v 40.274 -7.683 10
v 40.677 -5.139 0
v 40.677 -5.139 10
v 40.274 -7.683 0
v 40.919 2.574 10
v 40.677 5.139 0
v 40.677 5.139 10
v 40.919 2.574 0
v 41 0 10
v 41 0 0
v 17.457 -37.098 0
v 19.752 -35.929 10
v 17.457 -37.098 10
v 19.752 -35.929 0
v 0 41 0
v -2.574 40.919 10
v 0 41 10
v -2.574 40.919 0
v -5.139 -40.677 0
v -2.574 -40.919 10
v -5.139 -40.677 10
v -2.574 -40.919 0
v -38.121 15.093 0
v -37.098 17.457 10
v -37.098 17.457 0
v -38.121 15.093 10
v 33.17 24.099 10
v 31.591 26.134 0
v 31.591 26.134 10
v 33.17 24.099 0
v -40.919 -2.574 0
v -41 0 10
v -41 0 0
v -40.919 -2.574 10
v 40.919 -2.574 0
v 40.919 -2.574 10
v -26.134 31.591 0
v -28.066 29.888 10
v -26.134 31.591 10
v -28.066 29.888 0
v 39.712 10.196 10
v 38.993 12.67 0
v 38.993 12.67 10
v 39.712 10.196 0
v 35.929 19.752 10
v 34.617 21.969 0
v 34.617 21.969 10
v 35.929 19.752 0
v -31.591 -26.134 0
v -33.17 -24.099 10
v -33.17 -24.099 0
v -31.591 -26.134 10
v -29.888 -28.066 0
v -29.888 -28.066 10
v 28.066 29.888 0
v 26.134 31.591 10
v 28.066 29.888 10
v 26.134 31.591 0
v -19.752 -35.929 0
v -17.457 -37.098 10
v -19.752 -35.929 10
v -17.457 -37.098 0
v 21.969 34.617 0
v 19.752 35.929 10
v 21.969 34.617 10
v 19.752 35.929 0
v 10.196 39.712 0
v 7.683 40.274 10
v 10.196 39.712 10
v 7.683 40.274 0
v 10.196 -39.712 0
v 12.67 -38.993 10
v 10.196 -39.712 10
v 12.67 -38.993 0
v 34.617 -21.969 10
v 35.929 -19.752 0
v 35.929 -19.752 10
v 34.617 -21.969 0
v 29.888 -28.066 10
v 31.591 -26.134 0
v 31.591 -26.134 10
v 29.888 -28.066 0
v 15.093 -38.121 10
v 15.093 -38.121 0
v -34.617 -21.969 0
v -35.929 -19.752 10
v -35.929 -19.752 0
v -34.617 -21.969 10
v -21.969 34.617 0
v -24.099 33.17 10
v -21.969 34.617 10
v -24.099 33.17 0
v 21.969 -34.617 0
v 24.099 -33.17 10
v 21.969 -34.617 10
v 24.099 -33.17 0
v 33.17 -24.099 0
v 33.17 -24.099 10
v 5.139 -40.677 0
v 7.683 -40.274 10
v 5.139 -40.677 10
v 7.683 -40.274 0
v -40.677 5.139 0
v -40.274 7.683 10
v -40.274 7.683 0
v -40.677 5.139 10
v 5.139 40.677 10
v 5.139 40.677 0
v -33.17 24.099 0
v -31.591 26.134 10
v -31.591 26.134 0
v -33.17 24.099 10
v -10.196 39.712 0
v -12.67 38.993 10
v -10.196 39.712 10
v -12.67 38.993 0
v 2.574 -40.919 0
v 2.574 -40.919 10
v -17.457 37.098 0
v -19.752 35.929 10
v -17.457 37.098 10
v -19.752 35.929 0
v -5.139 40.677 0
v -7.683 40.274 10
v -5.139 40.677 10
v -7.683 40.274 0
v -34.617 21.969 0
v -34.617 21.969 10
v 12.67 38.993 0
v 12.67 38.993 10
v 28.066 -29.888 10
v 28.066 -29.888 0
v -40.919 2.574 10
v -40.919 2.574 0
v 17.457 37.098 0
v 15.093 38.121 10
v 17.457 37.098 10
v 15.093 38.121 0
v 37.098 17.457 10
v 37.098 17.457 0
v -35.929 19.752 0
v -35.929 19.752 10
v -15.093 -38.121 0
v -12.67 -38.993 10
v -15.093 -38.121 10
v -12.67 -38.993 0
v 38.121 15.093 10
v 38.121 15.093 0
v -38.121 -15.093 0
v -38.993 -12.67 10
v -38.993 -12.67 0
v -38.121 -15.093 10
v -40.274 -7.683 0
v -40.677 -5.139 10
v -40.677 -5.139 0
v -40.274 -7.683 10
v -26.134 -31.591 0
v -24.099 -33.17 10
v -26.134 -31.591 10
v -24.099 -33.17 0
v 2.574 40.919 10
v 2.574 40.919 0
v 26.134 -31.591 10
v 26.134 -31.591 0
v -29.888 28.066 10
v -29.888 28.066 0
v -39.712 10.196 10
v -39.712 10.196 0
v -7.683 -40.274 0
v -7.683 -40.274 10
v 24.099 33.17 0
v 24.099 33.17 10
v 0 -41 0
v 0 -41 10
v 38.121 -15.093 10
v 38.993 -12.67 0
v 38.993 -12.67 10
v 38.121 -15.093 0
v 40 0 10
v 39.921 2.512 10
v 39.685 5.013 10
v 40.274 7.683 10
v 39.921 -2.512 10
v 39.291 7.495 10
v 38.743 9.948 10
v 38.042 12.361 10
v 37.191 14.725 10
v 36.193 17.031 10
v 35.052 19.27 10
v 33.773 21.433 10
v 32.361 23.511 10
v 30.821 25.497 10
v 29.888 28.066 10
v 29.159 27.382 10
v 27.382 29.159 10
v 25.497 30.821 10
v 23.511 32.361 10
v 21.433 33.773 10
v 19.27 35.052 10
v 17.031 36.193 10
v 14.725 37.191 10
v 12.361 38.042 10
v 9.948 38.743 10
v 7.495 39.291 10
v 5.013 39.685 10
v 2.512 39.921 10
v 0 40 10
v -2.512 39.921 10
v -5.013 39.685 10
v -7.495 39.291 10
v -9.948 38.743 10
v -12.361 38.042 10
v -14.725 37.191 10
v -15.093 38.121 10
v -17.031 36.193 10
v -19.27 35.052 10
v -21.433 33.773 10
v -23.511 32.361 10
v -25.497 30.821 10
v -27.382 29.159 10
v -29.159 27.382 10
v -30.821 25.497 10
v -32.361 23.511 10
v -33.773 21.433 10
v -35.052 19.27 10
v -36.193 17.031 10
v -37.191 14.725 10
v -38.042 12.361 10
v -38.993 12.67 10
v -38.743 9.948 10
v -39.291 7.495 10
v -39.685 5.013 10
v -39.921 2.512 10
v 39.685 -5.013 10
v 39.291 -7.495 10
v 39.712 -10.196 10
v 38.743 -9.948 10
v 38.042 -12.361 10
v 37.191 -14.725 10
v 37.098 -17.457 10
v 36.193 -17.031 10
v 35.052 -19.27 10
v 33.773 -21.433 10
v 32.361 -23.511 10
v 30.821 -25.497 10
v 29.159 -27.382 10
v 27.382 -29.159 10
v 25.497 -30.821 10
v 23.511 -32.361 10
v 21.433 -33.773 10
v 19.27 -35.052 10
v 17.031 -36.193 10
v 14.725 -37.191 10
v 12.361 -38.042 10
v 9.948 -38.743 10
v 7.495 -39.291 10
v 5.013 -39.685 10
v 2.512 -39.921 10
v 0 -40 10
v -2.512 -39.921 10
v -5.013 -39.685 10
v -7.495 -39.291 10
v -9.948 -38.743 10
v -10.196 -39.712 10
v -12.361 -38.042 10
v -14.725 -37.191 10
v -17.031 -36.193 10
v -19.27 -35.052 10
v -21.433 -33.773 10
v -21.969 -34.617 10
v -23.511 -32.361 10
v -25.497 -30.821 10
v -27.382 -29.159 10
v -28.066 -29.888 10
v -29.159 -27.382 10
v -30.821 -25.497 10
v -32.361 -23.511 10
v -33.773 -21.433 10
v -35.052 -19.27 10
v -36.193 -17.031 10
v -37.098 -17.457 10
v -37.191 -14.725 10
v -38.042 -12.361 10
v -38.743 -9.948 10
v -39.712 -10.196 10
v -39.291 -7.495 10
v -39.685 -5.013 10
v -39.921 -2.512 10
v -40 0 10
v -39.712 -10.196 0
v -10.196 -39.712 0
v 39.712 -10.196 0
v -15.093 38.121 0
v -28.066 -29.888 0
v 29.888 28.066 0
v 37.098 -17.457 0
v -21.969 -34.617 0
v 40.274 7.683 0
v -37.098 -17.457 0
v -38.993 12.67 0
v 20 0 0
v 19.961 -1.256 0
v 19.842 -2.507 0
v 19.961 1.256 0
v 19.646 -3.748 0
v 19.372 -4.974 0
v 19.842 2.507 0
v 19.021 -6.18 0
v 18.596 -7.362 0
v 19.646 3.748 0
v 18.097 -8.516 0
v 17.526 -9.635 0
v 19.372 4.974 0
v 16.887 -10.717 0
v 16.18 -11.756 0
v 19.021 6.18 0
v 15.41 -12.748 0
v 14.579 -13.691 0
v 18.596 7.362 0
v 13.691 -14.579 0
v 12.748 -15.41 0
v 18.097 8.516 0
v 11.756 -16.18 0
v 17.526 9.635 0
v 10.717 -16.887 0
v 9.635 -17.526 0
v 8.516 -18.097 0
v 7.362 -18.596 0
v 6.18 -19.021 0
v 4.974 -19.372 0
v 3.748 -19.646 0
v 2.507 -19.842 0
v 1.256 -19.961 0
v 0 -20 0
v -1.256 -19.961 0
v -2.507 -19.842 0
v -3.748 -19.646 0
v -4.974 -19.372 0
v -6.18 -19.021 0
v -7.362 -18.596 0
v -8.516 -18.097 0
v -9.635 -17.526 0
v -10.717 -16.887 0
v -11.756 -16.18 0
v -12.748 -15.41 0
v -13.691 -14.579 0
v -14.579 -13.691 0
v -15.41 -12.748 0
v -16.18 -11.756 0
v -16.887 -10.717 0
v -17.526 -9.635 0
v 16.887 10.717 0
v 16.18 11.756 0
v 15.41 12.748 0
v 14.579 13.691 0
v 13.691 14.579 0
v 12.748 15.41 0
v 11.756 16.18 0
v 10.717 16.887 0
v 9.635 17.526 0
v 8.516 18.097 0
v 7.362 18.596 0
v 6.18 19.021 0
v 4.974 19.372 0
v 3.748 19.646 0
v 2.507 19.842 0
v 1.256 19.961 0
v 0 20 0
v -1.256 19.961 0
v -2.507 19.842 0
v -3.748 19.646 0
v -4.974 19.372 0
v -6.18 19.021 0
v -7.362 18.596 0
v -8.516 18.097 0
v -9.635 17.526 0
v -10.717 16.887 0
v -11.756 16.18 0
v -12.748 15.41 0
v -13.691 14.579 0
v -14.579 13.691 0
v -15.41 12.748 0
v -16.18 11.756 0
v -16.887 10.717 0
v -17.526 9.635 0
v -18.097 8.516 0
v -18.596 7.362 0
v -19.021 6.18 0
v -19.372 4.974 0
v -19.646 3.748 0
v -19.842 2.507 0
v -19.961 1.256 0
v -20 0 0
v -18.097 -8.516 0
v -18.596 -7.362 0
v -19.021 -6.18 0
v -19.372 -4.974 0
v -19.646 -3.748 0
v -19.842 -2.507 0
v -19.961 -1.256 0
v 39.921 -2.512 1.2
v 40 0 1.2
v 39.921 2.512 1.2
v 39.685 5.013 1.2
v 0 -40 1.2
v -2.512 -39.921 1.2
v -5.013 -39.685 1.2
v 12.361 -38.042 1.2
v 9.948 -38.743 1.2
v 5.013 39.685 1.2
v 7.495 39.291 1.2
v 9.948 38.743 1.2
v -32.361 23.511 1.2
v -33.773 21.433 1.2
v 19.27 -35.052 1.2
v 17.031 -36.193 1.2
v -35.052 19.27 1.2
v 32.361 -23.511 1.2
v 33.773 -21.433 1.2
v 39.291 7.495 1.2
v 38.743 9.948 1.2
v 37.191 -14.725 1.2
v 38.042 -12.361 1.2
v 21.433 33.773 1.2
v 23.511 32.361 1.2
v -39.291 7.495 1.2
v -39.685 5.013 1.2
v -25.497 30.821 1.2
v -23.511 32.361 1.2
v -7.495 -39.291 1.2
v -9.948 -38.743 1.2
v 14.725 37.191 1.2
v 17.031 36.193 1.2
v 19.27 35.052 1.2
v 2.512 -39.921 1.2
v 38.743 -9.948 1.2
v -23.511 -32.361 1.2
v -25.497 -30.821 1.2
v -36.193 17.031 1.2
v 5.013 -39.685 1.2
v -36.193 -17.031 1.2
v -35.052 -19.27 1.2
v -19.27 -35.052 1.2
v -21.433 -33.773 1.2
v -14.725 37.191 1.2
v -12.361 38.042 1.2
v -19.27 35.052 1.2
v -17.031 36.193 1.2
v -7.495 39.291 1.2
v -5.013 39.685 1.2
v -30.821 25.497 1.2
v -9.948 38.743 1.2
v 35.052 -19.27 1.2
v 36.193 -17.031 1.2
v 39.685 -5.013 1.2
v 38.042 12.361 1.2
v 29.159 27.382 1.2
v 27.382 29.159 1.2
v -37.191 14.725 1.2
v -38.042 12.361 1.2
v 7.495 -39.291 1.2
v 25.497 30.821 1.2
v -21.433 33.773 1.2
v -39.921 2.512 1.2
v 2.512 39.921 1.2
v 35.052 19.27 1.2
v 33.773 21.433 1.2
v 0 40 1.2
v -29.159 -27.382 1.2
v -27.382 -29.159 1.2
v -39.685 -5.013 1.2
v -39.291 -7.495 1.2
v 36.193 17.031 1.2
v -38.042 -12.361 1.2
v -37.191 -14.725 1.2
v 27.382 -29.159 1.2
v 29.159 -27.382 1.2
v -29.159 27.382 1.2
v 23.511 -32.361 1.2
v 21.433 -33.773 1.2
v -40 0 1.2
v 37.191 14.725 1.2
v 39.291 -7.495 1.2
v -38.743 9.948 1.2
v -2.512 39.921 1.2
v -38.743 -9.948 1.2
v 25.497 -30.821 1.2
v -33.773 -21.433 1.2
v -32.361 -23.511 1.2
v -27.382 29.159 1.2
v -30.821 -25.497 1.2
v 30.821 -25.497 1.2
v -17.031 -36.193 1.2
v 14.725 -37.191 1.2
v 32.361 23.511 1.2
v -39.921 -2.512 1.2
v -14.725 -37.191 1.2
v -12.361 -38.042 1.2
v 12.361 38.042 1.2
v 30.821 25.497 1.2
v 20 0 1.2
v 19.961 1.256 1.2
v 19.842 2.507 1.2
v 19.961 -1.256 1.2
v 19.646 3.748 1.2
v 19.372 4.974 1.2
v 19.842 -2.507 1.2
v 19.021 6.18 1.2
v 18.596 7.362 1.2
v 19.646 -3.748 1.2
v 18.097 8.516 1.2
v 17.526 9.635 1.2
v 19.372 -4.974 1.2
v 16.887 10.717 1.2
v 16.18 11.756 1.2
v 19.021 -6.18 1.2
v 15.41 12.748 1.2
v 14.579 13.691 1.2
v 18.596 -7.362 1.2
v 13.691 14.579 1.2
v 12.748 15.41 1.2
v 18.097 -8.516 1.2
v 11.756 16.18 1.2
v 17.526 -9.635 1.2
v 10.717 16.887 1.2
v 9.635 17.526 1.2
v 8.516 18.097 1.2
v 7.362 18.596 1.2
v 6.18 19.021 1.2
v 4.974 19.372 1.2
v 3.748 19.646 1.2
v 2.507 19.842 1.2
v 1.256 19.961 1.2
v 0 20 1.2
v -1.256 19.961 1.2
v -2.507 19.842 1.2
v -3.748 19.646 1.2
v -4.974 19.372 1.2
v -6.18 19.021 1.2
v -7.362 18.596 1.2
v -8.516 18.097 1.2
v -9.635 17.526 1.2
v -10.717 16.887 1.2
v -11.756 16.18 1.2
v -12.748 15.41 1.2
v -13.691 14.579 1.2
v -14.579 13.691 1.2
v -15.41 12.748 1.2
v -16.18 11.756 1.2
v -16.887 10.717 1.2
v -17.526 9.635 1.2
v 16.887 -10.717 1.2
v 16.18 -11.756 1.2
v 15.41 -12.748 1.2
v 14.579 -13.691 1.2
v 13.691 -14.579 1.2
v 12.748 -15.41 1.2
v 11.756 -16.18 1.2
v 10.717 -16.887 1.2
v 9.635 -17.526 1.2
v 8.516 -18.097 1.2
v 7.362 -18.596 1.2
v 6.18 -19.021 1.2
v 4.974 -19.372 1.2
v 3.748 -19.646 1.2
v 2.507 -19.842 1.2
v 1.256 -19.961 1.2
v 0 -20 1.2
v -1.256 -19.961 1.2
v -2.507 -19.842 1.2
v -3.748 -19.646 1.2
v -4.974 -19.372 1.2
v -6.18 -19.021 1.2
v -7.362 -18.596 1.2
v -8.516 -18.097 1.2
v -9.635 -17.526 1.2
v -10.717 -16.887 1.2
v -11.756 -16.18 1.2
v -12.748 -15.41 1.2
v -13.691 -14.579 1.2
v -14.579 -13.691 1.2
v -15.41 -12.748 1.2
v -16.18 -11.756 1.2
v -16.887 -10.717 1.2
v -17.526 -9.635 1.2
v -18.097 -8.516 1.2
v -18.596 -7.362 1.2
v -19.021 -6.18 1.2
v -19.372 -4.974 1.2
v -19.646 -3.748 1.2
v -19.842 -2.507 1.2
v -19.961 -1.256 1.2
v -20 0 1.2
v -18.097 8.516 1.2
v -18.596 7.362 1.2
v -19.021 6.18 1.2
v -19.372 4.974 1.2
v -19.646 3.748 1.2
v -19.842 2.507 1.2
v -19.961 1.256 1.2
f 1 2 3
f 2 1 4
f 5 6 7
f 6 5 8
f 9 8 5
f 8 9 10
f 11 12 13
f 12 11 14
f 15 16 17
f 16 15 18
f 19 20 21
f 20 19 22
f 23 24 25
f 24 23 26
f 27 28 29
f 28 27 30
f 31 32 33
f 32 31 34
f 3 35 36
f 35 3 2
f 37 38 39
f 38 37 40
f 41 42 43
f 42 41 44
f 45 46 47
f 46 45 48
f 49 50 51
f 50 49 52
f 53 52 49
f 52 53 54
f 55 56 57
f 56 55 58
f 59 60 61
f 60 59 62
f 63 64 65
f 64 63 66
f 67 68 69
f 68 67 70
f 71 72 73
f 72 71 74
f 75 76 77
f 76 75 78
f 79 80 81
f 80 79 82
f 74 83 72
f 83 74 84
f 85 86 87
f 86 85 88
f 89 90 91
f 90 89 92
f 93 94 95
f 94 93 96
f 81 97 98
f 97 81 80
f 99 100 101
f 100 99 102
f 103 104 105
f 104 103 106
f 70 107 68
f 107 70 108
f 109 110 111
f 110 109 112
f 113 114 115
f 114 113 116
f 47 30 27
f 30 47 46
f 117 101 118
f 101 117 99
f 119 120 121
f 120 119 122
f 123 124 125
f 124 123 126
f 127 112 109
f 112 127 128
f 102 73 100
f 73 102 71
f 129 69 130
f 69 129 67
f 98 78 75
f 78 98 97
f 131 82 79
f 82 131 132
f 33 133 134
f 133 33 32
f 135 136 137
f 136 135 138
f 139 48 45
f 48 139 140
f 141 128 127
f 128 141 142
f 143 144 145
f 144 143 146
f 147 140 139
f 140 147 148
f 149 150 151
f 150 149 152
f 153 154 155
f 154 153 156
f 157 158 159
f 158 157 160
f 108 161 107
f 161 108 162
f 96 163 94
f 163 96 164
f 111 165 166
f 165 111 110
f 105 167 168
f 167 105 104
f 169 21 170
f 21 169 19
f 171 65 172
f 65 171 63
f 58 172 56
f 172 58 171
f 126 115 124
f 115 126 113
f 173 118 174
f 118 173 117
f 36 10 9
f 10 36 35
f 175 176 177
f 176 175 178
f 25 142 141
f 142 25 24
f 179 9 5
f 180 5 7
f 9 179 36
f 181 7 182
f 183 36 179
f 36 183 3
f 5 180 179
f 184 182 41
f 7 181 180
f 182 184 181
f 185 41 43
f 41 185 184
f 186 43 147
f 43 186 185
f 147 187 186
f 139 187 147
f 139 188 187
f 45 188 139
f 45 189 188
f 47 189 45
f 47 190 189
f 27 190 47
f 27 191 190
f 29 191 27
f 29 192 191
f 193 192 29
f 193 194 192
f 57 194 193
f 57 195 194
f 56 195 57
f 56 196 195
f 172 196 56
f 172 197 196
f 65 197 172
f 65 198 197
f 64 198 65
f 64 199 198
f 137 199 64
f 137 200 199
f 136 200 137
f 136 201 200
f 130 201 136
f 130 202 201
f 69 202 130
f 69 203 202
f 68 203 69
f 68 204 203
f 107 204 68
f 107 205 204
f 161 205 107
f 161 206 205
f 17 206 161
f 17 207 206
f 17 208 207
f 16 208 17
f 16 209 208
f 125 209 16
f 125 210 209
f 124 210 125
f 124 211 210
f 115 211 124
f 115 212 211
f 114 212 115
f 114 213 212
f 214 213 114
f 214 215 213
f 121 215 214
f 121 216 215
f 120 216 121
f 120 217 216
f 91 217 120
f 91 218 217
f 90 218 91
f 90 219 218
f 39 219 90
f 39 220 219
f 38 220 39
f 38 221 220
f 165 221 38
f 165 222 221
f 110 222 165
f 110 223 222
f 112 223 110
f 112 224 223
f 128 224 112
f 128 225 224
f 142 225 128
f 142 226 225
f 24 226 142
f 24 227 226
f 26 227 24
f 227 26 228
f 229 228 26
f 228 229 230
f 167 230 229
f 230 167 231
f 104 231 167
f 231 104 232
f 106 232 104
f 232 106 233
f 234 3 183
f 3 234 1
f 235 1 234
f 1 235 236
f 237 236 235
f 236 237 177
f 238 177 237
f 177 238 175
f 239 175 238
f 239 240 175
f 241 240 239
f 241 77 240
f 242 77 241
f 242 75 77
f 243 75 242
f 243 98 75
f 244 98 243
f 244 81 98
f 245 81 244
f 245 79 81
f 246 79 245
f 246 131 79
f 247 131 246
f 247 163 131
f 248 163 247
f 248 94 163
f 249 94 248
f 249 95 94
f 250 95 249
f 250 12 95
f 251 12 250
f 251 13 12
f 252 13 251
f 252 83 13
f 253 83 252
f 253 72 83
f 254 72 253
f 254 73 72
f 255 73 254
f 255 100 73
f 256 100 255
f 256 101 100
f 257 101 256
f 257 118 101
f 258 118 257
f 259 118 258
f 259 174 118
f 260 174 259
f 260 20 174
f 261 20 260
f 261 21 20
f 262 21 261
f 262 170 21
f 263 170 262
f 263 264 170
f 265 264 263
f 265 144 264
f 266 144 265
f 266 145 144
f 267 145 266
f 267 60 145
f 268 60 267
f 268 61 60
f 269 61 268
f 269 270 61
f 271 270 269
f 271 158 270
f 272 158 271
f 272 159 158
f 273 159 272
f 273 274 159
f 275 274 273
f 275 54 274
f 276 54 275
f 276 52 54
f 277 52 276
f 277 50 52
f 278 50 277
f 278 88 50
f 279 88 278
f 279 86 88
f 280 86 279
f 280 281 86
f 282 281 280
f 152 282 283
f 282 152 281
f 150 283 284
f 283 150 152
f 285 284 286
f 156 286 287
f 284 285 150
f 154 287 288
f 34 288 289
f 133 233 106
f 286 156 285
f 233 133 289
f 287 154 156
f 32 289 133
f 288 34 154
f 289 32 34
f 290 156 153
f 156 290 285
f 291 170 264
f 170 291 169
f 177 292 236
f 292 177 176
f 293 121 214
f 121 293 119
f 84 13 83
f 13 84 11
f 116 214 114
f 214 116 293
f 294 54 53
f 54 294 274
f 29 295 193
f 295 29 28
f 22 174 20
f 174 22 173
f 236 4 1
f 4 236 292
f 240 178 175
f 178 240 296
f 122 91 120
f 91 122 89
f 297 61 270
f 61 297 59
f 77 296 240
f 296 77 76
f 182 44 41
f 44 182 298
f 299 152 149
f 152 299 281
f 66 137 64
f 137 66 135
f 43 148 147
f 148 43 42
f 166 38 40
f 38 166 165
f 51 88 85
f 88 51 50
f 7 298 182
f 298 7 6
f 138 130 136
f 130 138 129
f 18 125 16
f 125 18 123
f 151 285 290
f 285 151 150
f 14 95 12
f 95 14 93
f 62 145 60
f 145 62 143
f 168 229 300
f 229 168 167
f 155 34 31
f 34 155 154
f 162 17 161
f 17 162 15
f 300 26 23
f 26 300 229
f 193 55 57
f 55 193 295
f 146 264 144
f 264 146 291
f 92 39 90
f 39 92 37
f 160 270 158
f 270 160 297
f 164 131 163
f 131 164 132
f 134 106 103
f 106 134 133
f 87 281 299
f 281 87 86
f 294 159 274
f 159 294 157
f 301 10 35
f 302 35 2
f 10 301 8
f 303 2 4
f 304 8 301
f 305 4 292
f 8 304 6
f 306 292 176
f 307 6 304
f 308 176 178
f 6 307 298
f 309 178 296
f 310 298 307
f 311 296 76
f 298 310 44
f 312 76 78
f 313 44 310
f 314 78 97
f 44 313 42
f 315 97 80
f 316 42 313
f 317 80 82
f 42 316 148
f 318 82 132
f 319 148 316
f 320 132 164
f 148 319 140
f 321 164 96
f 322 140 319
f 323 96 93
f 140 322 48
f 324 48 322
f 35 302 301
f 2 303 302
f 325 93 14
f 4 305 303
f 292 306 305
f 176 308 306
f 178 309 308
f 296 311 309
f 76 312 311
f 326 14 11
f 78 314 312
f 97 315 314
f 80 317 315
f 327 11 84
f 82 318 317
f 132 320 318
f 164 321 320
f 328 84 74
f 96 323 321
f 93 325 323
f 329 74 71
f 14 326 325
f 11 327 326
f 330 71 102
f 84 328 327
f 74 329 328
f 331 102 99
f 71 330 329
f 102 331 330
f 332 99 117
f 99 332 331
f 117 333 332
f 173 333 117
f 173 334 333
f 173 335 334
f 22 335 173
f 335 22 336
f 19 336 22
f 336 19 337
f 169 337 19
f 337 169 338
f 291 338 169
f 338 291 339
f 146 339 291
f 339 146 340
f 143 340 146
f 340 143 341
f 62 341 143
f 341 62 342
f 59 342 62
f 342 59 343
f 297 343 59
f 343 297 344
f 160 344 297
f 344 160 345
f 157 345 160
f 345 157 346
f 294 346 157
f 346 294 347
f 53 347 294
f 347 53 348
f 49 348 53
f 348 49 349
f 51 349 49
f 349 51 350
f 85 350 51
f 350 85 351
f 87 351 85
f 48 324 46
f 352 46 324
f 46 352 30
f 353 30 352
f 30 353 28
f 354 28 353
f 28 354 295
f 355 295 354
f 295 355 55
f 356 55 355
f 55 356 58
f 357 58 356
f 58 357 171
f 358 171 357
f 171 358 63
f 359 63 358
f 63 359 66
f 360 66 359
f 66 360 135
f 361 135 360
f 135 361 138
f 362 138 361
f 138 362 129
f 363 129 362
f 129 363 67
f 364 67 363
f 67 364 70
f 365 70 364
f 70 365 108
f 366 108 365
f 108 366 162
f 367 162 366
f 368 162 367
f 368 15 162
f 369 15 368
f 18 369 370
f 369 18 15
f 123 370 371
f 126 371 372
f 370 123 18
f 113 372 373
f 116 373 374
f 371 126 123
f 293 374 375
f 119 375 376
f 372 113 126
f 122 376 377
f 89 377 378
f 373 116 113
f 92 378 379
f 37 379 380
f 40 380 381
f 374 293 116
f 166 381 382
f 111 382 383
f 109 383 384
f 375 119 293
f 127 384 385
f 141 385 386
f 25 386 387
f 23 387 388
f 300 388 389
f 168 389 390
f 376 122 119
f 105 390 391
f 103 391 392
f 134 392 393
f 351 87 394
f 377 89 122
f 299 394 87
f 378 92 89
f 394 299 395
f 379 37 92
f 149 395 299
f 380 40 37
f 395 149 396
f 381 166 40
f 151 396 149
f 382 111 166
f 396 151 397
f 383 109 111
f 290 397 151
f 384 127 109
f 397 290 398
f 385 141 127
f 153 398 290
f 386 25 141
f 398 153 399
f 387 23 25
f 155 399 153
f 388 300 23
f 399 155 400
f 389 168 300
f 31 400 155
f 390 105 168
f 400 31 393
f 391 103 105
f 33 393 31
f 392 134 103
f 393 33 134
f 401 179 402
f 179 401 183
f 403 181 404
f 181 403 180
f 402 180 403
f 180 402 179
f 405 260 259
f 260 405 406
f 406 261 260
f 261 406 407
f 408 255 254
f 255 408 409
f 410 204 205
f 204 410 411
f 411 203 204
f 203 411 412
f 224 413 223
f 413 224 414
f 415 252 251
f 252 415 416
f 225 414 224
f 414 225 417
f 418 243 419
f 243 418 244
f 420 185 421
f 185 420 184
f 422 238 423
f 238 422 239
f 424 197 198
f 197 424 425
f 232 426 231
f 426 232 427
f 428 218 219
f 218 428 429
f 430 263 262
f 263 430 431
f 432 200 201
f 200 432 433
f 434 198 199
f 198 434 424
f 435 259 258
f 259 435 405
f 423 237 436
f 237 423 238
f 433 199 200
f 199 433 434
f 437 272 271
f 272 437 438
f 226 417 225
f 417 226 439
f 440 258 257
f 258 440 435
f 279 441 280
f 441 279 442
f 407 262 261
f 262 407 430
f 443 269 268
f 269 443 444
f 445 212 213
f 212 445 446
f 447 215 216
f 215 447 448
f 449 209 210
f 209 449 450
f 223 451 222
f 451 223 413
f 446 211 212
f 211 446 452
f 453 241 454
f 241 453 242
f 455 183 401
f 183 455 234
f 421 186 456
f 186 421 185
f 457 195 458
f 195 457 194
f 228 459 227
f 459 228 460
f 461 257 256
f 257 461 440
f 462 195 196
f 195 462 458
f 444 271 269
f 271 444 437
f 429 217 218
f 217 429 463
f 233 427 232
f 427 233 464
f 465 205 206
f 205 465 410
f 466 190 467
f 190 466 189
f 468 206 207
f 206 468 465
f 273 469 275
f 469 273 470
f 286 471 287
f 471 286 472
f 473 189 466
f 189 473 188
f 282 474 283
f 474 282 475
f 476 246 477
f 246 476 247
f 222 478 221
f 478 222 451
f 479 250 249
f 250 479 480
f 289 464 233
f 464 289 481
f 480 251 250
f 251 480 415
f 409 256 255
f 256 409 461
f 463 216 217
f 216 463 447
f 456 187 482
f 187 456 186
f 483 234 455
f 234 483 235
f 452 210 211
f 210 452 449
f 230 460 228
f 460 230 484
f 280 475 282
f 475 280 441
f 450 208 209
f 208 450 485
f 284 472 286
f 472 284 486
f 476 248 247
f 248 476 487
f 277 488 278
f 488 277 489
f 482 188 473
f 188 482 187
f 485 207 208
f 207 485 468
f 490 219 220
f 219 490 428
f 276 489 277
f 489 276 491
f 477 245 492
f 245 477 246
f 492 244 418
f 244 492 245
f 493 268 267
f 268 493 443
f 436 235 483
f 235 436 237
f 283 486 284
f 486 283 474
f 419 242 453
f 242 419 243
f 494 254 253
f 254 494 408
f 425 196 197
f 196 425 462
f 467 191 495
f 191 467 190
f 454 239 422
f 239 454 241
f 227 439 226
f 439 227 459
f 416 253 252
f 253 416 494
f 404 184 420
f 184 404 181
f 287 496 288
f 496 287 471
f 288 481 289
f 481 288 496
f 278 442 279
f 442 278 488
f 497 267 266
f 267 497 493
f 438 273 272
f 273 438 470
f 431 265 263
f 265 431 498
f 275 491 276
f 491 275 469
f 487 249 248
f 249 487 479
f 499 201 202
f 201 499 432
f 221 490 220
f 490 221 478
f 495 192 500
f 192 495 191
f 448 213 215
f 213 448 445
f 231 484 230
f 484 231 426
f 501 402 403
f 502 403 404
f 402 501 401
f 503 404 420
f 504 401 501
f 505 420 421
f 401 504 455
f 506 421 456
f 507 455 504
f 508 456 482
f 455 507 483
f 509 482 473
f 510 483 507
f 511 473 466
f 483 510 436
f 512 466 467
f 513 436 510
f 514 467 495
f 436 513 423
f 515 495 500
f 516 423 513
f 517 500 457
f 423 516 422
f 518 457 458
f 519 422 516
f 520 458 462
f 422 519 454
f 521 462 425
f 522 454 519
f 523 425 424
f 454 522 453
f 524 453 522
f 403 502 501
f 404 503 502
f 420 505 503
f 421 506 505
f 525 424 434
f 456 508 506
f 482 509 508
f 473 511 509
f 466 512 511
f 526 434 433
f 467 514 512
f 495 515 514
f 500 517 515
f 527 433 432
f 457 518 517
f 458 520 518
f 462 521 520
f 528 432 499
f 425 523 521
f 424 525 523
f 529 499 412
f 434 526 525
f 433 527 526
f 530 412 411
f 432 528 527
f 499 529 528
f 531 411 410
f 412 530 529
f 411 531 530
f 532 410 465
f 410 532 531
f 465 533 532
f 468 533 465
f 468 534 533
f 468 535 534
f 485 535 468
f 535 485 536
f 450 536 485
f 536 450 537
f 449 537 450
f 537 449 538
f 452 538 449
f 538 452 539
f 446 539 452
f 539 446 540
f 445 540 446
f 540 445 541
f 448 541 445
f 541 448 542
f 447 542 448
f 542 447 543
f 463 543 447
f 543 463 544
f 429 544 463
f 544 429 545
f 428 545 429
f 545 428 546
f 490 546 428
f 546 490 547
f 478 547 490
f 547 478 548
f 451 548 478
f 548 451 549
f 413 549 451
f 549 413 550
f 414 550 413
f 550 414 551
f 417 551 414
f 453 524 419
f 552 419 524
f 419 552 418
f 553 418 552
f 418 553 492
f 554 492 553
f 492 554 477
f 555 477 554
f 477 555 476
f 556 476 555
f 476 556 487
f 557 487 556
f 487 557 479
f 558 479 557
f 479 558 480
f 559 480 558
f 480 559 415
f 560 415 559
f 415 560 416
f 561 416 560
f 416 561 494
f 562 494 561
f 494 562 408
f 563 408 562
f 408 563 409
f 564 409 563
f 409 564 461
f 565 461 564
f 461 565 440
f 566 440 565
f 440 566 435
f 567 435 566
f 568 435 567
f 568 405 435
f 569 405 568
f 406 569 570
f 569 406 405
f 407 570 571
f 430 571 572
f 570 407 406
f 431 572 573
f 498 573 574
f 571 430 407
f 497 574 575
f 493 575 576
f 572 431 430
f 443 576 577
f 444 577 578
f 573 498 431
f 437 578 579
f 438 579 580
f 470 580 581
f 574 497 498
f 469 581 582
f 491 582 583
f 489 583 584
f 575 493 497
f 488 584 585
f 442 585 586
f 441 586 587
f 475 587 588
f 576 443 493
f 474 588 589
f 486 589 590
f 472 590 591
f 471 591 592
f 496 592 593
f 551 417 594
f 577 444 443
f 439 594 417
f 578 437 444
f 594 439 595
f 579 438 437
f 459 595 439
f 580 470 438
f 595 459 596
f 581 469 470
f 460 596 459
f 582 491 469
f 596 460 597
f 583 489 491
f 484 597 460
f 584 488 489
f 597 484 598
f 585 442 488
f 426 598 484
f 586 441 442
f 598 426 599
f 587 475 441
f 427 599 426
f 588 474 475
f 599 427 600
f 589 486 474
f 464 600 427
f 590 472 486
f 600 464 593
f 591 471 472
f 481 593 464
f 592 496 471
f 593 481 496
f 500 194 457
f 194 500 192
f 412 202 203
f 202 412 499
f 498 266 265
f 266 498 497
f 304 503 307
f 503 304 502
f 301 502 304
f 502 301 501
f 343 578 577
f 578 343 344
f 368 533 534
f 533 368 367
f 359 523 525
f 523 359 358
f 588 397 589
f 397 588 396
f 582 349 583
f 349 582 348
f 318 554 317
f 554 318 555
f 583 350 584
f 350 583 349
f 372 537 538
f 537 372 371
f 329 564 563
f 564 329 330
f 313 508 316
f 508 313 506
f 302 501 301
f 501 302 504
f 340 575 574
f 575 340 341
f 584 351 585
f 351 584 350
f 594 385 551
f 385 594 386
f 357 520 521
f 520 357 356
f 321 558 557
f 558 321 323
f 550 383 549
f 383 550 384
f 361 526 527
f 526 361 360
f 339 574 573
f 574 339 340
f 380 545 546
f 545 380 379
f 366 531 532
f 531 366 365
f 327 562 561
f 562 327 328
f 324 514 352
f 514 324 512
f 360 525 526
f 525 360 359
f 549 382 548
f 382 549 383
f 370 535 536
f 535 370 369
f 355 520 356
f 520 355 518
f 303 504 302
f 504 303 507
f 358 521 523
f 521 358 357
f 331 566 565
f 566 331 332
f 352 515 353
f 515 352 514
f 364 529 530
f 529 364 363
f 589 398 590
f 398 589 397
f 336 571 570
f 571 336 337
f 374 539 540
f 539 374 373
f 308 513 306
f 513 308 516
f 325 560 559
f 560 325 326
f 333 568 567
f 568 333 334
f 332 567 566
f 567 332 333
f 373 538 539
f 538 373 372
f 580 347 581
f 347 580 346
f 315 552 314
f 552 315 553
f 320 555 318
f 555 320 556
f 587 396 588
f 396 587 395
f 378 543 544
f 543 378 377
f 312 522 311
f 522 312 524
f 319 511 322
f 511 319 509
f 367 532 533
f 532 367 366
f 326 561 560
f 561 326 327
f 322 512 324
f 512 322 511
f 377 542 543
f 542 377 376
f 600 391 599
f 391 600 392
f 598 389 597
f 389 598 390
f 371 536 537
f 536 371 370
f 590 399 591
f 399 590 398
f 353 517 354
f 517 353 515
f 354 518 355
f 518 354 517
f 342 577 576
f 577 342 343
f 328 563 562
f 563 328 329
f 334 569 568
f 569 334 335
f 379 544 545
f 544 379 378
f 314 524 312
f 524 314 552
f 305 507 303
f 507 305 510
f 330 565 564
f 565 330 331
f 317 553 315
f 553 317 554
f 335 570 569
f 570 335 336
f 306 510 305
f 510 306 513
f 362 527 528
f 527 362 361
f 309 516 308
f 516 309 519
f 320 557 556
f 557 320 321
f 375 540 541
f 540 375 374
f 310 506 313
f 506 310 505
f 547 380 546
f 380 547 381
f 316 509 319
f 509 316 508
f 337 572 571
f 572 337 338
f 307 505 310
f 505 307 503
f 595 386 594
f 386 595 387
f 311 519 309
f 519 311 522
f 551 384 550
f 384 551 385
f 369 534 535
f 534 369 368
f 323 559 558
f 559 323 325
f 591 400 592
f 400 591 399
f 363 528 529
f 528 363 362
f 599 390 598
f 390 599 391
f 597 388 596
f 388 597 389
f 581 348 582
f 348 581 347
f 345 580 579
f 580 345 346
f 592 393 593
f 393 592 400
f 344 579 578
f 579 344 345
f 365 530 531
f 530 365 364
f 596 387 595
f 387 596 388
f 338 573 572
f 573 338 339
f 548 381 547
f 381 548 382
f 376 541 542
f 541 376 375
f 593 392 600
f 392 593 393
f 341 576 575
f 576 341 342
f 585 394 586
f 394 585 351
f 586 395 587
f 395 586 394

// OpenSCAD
thickness = 1.2;
wall_thickness = 2;
diameter = 80;
height = 10;

opening_dia = 40;

$fn = 100;

difference() {
  cylinder(d = diameter + wall_thickness, h = height);
  translate([0, 0, thickness])
    cylinder(d = diameter, h = height);

  cylinder(d = opening_dia, h = 4 * thickness, center=true);
}
